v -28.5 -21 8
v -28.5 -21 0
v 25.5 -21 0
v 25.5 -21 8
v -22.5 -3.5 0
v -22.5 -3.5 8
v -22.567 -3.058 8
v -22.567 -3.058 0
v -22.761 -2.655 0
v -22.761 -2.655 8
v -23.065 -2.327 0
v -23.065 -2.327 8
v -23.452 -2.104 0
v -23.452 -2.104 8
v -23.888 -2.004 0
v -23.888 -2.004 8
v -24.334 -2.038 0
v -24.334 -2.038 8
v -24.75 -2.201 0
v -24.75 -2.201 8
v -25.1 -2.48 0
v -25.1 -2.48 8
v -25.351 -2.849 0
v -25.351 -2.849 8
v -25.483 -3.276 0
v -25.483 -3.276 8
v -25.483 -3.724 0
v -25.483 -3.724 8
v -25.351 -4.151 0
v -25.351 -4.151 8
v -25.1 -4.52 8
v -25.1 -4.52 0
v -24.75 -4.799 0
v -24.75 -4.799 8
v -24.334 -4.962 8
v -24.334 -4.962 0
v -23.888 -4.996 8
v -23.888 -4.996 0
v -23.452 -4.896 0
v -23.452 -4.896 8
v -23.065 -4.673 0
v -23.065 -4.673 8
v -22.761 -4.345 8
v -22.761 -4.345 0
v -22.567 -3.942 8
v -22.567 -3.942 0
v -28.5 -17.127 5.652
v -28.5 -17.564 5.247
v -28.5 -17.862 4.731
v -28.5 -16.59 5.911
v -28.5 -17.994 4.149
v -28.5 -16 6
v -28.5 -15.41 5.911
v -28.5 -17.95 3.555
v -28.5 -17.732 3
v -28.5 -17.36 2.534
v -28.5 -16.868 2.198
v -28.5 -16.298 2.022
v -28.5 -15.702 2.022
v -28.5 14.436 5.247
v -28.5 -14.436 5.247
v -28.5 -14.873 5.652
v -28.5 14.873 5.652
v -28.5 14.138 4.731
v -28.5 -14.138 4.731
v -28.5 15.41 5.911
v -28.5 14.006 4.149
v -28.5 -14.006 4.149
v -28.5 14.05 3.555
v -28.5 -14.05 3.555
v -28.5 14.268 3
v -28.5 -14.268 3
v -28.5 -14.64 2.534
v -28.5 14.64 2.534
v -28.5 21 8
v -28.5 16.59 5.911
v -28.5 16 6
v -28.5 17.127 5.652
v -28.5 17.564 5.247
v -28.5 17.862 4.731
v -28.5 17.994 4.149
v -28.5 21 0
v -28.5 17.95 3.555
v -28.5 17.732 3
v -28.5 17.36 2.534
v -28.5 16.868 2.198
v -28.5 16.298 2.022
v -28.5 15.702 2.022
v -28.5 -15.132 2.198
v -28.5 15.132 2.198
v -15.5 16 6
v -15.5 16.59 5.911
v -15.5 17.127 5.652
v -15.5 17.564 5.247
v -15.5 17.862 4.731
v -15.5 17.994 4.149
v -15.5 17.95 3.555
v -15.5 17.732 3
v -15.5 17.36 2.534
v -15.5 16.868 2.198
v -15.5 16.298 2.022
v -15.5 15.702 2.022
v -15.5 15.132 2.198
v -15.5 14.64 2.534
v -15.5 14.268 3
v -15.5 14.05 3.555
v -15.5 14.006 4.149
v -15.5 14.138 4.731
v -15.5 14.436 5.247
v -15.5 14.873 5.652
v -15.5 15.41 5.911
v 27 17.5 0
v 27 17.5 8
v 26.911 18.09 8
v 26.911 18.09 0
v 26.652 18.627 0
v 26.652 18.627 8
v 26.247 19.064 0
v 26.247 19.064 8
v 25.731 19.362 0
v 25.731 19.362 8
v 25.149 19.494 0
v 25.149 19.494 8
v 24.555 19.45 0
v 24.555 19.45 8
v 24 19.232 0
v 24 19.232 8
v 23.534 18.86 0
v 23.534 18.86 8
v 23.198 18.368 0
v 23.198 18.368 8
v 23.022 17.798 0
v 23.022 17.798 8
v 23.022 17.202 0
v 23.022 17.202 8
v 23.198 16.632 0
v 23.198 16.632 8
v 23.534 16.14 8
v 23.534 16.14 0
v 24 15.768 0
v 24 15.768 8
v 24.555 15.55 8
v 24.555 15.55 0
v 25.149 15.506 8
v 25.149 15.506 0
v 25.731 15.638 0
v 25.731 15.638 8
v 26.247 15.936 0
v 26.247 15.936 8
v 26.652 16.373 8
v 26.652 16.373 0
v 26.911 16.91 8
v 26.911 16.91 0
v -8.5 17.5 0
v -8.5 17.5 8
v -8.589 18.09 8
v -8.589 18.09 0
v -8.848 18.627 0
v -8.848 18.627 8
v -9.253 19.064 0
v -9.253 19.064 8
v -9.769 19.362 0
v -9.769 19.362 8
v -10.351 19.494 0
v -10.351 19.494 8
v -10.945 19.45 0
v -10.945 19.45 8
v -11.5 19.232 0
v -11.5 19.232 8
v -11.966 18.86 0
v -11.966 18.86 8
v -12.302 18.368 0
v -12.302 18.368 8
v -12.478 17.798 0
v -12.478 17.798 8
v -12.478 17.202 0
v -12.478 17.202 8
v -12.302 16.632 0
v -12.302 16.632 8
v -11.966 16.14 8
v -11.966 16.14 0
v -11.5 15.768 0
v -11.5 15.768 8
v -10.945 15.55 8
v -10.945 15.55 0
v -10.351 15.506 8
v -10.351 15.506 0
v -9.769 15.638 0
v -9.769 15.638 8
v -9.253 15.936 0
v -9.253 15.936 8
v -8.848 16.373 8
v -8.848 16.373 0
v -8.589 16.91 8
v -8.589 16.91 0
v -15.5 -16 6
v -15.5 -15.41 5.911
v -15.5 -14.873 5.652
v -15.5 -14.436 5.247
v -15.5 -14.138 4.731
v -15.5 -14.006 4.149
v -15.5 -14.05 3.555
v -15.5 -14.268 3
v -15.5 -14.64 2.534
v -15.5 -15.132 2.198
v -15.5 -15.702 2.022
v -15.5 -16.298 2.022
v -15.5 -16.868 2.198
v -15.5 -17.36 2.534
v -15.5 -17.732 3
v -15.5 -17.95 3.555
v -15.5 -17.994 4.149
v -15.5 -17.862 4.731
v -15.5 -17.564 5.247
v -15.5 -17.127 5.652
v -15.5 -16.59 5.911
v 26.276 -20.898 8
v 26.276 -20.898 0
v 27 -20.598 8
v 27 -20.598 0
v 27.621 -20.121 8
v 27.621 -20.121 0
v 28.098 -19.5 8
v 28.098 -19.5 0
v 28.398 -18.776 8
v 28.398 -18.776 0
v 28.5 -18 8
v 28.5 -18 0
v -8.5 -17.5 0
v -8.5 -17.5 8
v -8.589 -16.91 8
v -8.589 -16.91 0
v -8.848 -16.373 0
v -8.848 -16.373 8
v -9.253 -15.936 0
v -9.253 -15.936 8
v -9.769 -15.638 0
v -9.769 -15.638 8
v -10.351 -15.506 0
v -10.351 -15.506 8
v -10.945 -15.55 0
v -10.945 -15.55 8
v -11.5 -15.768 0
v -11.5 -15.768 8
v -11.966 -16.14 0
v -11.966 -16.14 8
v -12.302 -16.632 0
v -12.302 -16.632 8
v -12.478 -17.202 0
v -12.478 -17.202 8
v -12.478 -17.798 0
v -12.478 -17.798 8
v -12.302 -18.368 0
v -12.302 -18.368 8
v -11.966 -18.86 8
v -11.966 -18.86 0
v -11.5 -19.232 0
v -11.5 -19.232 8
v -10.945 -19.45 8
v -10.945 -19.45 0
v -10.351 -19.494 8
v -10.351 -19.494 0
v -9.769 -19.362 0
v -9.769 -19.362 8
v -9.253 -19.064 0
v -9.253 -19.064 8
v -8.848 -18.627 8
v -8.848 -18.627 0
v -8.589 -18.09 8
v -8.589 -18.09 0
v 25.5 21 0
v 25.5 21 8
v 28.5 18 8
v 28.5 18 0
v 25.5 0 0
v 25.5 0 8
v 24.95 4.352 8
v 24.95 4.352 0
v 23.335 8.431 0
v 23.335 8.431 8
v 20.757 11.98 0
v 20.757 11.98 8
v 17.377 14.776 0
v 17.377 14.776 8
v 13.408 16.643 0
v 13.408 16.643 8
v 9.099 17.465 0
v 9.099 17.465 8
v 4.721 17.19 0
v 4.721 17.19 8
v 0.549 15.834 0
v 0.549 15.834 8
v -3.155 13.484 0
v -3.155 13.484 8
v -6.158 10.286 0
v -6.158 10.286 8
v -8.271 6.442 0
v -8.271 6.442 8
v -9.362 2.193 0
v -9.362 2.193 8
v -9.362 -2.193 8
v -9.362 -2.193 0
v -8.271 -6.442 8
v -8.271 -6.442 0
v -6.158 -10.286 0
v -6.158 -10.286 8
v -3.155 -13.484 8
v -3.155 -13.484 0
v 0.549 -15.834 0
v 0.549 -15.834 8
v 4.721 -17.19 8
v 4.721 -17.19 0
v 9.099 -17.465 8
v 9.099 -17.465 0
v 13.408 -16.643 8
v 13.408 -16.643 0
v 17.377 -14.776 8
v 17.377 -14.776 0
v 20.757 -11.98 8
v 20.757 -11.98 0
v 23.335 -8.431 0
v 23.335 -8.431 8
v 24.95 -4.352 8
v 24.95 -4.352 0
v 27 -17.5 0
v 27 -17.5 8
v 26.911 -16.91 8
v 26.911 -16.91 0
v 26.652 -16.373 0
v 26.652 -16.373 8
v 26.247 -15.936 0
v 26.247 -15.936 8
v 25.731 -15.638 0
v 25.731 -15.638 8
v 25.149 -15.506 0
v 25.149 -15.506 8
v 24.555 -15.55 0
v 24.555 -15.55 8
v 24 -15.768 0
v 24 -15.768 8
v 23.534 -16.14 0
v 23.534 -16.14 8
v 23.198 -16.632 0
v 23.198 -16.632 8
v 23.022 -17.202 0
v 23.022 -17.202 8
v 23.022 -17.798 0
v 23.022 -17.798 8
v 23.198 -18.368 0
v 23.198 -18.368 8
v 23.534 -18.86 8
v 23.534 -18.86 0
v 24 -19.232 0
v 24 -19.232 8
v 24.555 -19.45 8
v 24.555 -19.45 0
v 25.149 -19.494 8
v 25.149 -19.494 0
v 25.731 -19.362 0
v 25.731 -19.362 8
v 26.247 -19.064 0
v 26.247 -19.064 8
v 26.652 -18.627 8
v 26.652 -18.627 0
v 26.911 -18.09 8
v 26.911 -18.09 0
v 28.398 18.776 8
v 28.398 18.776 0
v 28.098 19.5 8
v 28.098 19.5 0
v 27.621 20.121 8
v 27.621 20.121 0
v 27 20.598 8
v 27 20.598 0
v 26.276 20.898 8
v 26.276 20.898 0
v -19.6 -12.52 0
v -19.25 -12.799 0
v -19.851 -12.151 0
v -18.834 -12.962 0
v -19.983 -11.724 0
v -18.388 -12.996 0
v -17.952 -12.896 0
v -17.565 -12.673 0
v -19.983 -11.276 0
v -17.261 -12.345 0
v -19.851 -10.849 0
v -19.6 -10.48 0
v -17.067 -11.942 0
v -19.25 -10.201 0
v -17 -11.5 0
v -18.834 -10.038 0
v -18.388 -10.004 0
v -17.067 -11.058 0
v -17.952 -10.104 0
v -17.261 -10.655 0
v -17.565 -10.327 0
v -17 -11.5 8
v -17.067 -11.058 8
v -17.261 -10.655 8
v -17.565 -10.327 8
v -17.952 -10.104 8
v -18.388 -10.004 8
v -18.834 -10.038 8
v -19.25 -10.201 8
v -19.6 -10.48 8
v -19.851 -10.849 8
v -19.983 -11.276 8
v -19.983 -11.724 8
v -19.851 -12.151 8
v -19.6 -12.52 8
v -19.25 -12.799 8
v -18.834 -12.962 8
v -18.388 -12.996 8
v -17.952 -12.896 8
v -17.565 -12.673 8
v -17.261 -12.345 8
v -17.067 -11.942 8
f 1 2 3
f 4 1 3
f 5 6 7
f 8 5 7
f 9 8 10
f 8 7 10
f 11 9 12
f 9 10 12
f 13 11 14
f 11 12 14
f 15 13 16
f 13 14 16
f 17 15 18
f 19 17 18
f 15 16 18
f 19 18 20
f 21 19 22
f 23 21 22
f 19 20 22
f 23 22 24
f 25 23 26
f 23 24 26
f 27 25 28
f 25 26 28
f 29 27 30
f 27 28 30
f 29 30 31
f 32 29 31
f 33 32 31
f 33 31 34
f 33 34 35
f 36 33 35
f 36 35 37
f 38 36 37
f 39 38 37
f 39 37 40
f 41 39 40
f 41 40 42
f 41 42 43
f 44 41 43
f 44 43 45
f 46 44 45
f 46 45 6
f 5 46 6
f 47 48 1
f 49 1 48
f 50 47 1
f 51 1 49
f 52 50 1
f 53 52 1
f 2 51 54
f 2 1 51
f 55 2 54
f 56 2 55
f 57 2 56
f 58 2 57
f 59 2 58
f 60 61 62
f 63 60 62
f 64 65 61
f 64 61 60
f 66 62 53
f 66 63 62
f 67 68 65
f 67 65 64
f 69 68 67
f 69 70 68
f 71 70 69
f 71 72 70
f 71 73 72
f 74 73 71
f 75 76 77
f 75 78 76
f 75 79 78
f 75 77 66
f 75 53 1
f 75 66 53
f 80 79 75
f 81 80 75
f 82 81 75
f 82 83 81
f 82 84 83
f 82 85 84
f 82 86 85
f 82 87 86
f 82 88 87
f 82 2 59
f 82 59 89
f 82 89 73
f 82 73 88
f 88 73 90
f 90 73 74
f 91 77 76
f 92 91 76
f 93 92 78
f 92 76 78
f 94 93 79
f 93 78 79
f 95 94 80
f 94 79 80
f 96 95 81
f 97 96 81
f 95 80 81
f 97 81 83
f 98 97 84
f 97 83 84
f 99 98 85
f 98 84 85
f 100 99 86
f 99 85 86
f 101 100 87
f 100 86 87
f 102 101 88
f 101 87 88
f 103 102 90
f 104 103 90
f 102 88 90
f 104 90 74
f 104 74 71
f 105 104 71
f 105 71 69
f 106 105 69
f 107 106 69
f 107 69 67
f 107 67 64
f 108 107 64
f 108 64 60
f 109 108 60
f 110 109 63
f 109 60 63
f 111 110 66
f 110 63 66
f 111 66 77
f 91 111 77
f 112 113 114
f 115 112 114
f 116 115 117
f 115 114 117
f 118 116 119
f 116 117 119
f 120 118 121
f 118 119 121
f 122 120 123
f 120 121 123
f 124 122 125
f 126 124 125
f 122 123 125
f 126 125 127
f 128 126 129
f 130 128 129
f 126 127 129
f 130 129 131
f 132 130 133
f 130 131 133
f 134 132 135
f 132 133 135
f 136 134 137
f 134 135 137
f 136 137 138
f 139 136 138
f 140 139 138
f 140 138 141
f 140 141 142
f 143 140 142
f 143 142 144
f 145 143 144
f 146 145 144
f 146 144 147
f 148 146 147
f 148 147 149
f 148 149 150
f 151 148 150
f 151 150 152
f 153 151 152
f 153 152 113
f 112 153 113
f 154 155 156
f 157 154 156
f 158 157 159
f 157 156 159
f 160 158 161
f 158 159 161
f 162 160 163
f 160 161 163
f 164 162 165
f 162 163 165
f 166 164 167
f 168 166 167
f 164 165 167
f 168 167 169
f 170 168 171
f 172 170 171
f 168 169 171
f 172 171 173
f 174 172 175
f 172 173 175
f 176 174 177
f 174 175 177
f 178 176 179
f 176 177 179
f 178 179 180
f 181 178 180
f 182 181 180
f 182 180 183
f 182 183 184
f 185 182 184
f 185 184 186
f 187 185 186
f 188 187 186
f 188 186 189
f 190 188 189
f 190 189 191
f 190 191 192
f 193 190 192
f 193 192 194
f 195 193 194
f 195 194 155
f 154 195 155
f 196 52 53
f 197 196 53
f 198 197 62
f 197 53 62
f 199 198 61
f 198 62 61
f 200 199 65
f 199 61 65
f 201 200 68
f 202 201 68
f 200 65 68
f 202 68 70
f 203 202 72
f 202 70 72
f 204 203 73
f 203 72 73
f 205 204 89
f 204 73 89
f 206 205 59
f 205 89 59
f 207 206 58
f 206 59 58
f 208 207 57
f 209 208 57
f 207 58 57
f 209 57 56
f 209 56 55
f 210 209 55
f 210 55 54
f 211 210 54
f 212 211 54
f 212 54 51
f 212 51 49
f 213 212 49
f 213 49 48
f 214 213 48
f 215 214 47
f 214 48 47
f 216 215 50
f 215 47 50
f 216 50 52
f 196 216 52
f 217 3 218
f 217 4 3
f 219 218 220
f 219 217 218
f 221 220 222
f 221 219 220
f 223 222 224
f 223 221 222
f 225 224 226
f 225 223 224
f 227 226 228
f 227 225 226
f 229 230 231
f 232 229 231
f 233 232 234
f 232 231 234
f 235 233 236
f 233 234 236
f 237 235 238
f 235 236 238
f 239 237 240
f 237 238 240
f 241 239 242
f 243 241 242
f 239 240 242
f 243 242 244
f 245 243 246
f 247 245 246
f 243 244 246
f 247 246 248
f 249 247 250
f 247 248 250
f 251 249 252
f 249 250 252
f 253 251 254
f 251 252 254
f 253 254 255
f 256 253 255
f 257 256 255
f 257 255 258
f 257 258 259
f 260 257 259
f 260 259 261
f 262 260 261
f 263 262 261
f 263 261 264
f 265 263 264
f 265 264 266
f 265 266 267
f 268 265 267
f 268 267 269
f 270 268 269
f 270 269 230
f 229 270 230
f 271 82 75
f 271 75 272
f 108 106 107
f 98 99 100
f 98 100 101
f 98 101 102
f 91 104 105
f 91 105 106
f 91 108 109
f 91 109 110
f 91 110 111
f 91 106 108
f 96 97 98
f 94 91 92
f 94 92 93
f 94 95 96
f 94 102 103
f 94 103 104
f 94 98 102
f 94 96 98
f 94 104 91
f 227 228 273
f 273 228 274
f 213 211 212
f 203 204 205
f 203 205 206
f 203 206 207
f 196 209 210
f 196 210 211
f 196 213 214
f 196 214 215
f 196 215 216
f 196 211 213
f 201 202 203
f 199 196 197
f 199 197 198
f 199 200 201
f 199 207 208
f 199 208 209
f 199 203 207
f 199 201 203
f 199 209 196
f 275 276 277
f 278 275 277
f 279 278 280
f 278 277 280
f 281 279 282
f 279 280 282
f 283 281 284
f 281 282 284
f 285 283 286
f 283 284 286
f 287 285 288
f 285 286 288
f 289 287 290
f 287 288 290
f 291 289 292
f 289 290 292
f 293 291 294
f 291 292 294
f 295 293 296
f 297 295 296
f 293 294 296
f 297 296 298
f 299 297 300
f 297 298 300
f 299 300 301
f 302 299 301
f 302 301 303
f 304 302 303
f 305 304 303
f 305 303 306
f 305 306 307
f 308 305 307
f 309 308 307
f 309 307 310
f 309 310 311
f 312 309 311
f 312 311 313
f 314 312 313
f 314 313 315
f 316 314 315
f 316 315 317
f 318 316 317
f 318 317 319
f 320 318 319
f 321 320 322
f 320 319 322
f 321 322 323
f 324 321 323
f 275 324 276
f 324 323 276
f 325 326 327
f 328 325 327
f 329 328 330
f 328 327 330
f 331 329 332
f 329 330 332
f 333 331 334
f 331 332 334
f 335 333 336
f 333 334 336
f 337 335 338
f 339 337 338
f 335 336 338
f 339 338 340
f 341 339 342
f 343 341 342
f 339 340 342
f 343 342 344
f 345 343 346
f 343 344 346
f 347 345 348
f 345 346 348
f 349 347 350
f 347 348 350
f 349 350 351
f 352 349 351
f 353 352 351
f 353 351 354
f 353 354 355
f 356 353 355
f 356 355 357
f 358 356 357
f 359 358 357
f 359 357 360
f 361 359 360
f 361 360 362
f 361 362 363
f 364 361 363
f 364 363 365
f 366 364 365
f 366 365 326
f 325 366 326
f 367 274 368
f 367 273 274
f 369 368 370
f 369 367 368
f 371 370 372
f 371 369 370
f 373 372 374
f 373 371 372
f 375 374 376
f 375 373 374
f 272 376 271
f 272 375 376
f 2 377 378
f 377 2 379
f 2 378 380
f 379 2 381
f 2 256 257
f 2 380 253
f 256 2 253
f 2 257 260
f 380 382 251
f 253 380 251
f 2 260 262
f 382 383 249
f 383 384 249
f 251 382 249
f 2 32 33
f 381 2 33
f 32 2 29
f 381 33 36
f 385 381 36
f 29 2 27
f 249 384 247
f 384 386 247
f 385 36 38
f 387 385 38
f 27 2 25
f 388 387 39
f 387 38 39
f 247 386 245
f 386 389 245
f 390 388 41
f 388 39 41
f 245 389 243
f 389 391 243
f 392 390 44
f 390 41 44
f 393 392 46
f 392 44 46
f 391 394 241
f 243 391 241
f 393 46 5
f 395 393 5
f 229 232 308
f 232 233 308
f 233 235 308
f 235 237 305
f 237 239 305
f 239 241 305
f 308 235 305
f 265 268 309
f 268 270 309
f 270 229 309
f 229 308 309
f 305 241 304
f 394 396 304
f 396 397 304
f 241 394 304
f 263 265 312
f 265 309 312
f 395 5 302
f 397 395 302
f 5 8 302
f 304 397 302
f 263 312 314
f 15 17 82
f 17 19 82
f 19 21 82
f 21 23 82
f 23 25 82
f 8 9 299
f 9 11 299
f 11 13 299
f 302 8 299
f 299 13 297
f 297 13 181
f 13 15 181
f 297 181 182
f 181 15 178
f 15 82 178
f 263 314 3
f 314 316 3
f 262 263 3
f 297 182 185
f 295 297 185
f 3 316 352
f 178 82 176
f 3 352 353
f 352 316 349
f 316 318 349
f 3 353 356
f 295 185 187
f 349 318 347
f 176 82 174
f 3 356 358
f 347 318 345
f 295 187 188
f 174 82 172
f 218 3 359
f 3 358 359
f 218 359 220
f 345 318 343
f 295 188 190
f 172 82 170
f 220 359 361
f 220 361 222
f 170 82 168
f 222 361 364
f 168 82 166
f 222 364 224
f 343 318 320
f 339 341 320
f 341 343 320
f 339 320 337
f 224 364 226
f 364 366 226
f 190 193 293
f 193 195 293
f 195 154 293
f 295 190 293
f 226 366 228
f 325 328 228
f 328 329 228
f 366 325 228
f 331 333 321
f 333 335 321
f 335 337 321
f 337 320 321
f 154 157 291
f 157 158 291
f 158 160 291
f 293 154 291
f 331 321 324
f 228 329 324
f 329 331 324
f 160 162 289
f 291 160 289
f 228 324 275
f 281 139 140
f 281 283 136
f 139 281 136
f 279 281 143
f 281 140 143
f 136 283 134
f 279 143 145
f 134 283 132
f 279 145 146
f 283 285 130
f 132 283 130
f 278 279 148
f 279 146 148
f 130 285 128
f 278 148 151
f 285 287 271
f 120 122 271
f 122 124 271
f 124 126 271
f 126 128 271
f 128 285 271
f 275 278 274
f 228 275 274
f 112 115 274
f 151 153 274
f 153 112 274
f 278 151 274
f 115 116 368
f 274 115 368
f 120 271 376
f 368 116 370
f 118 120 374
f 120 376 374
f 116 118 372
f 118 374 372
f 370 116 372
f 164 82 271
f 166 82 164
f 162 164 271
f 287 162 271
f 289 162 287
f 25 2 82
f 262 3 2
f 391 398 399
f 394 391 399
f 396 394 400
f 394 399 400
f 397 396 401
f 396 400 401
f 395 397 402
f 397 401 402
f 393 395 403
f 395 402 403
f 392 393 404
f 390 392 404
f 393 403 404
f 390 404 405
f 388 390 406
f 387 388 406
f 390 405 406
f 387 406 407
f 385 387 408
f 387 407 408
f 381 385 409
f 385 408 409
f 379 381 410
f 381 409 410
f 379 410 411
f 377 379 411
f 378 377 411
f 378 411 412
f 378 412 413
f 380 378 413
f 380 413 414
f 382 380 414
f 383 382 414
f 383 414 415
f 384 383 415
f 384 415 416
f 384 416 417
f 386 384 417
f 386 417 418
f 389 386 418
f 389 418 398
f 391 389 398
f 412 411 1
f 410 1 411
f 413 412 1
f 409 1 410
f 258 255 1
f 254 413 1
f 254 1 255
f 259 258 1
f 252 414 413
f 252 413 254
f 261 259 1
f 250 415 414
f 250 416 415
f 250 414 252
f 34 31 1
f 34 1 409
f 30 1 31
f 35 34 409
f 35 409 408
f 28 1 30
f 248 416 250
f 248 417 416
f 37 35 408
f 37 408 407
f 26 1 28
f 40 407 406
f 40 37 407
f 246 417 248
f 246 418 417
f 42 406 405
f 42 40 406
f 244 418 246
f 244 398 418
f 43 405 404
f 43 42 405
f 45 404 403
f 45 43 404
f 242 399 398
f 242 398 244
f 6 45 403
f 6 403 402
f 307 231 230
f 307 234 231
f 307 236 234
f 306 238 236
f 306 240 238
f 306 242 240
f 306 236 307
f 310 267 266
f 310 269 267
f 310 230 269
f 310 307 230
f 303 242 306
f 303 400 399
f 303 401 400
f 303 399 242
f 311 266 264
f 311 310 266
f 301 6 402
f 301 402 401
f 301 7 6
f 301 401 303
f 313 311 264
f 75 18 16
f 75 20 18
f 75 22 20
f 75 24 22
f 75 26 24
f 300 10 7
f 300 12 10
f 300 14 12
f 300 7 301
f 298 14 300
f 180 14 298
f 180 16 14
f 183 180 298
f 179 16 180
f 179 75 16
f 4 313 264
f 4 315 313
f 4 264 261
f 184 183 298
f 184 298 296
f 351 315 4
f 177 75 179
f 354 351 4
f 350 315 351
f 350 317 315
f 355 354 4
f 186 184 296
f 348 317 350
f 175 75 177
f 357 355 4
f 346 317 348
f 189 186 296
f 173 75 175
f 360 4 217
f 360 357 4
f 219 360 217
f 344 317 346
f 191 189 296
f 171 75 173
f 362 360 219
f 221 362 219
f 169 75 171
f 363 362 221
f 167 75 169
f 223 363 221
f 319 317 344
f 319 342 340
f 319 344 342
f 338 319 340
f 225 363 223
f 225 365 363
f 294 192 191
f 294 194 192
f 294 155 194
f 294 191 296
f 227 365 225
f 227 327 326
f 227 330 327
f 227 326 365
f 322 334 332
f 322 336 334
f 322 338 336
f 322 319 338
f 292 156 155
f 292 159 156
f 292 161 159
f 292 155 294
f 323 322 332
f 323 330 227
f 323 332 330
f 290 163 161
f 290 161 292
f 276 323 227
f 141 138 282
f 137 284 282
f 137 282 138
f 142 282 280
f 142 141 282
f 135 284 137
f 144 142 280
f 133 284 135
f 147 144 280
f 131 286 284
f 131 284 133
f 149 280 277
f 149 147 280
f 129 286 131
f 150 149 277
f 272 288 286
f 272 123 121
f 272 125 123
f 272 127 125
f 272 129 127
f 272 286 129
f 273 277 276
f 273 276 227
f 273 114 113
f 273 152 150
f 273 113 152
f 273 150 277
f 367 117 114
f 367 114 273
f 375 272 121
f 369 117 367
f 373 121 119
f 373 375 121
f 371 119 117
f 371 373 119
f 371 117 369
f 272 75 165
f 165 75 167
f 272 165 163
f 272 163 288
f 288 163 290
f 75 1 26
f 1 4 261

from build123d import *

# Parameters (mm, degrees)
SKETCH1_W           = 57
SKETCH1_H           = 42
BOSS_EXTRUDE1_DEPTH = 8
SKETCH2_R           = 17.5
SKETCH2_R_2         = 2
SKETCH2_R_3         = 1.5
CUT_EXTRUDE1_DEPTH  = 9
FILLET1_R           = 3
FILLET2_R           = 3
SKETCH3_R           = 2
CUT_EXTRUDE2_DEPTH  = 13


with BuildPart() as part:
    # Sketch1 → Boss-Extrude1 (new body)
    with BuildSketch(Plane.XY):
        Rectangle(SKETCH1_W, SKETCH1_H)
    extrude(amount=BOSS_EXTRUDE1_DEPTH)

    # Sketch2 → Cut-Extrude1 (cut, through all)
    with BuildSketch(Plane.XY.offset(8)):
        with Locations((8, 0)):
            Circle(SKETCH2_R)
        with Locations((25, 17.5)):
            Circle(SKETCH2_R_2)
        with Locations((-10.5, 17.5)):
            Circle(SKETCH2_R_2)
        with Locations((25, -17.5)):
            Circle(SKETCH2_R_2)
        with Locations((-10.5, -17.5)):
            Circle(SKETCH2_R_2)
        with Locations((-18.5, -11.5)):
            Circle(SKETCH2_R_3)
        with Locations((-24, -3.5)):
            Circle(SKETCH2_R_3)
    extrude(amount=-CUT_EXTRUDE1_DEPTH, mode=Mode.SUBTRACT)

    # Fillet1
    fillet1_edges = [part.edges().sort_by_distance(p)[0] for p in [
        (28.5, -21, 4),
    ]]
    fillet(fillet1_edges, radius=FILLET1_R)

    # Fillet2
    fillet2_edges = [part.edges().sort_by_distance(p)[0] for p in [
        (28.5, 21, 4),
    ]]
    fillet(fillet2_edges, radius=FILLET2_R)

    # Sketch3 → Cut-Extrude2 (cut)
    with BuildSketch(Plane.ZY.offset(28.5)):
        with Locations((4, 16)):
            Circle(SKETCH3_R)
        with Locations((4, -16)):
            Circle(SKETCH3_R)
    extrude(amount=-CUT_EXTRUDE2_DEPTH, mode=Mode.SUBTRACT)


solid = part.part
